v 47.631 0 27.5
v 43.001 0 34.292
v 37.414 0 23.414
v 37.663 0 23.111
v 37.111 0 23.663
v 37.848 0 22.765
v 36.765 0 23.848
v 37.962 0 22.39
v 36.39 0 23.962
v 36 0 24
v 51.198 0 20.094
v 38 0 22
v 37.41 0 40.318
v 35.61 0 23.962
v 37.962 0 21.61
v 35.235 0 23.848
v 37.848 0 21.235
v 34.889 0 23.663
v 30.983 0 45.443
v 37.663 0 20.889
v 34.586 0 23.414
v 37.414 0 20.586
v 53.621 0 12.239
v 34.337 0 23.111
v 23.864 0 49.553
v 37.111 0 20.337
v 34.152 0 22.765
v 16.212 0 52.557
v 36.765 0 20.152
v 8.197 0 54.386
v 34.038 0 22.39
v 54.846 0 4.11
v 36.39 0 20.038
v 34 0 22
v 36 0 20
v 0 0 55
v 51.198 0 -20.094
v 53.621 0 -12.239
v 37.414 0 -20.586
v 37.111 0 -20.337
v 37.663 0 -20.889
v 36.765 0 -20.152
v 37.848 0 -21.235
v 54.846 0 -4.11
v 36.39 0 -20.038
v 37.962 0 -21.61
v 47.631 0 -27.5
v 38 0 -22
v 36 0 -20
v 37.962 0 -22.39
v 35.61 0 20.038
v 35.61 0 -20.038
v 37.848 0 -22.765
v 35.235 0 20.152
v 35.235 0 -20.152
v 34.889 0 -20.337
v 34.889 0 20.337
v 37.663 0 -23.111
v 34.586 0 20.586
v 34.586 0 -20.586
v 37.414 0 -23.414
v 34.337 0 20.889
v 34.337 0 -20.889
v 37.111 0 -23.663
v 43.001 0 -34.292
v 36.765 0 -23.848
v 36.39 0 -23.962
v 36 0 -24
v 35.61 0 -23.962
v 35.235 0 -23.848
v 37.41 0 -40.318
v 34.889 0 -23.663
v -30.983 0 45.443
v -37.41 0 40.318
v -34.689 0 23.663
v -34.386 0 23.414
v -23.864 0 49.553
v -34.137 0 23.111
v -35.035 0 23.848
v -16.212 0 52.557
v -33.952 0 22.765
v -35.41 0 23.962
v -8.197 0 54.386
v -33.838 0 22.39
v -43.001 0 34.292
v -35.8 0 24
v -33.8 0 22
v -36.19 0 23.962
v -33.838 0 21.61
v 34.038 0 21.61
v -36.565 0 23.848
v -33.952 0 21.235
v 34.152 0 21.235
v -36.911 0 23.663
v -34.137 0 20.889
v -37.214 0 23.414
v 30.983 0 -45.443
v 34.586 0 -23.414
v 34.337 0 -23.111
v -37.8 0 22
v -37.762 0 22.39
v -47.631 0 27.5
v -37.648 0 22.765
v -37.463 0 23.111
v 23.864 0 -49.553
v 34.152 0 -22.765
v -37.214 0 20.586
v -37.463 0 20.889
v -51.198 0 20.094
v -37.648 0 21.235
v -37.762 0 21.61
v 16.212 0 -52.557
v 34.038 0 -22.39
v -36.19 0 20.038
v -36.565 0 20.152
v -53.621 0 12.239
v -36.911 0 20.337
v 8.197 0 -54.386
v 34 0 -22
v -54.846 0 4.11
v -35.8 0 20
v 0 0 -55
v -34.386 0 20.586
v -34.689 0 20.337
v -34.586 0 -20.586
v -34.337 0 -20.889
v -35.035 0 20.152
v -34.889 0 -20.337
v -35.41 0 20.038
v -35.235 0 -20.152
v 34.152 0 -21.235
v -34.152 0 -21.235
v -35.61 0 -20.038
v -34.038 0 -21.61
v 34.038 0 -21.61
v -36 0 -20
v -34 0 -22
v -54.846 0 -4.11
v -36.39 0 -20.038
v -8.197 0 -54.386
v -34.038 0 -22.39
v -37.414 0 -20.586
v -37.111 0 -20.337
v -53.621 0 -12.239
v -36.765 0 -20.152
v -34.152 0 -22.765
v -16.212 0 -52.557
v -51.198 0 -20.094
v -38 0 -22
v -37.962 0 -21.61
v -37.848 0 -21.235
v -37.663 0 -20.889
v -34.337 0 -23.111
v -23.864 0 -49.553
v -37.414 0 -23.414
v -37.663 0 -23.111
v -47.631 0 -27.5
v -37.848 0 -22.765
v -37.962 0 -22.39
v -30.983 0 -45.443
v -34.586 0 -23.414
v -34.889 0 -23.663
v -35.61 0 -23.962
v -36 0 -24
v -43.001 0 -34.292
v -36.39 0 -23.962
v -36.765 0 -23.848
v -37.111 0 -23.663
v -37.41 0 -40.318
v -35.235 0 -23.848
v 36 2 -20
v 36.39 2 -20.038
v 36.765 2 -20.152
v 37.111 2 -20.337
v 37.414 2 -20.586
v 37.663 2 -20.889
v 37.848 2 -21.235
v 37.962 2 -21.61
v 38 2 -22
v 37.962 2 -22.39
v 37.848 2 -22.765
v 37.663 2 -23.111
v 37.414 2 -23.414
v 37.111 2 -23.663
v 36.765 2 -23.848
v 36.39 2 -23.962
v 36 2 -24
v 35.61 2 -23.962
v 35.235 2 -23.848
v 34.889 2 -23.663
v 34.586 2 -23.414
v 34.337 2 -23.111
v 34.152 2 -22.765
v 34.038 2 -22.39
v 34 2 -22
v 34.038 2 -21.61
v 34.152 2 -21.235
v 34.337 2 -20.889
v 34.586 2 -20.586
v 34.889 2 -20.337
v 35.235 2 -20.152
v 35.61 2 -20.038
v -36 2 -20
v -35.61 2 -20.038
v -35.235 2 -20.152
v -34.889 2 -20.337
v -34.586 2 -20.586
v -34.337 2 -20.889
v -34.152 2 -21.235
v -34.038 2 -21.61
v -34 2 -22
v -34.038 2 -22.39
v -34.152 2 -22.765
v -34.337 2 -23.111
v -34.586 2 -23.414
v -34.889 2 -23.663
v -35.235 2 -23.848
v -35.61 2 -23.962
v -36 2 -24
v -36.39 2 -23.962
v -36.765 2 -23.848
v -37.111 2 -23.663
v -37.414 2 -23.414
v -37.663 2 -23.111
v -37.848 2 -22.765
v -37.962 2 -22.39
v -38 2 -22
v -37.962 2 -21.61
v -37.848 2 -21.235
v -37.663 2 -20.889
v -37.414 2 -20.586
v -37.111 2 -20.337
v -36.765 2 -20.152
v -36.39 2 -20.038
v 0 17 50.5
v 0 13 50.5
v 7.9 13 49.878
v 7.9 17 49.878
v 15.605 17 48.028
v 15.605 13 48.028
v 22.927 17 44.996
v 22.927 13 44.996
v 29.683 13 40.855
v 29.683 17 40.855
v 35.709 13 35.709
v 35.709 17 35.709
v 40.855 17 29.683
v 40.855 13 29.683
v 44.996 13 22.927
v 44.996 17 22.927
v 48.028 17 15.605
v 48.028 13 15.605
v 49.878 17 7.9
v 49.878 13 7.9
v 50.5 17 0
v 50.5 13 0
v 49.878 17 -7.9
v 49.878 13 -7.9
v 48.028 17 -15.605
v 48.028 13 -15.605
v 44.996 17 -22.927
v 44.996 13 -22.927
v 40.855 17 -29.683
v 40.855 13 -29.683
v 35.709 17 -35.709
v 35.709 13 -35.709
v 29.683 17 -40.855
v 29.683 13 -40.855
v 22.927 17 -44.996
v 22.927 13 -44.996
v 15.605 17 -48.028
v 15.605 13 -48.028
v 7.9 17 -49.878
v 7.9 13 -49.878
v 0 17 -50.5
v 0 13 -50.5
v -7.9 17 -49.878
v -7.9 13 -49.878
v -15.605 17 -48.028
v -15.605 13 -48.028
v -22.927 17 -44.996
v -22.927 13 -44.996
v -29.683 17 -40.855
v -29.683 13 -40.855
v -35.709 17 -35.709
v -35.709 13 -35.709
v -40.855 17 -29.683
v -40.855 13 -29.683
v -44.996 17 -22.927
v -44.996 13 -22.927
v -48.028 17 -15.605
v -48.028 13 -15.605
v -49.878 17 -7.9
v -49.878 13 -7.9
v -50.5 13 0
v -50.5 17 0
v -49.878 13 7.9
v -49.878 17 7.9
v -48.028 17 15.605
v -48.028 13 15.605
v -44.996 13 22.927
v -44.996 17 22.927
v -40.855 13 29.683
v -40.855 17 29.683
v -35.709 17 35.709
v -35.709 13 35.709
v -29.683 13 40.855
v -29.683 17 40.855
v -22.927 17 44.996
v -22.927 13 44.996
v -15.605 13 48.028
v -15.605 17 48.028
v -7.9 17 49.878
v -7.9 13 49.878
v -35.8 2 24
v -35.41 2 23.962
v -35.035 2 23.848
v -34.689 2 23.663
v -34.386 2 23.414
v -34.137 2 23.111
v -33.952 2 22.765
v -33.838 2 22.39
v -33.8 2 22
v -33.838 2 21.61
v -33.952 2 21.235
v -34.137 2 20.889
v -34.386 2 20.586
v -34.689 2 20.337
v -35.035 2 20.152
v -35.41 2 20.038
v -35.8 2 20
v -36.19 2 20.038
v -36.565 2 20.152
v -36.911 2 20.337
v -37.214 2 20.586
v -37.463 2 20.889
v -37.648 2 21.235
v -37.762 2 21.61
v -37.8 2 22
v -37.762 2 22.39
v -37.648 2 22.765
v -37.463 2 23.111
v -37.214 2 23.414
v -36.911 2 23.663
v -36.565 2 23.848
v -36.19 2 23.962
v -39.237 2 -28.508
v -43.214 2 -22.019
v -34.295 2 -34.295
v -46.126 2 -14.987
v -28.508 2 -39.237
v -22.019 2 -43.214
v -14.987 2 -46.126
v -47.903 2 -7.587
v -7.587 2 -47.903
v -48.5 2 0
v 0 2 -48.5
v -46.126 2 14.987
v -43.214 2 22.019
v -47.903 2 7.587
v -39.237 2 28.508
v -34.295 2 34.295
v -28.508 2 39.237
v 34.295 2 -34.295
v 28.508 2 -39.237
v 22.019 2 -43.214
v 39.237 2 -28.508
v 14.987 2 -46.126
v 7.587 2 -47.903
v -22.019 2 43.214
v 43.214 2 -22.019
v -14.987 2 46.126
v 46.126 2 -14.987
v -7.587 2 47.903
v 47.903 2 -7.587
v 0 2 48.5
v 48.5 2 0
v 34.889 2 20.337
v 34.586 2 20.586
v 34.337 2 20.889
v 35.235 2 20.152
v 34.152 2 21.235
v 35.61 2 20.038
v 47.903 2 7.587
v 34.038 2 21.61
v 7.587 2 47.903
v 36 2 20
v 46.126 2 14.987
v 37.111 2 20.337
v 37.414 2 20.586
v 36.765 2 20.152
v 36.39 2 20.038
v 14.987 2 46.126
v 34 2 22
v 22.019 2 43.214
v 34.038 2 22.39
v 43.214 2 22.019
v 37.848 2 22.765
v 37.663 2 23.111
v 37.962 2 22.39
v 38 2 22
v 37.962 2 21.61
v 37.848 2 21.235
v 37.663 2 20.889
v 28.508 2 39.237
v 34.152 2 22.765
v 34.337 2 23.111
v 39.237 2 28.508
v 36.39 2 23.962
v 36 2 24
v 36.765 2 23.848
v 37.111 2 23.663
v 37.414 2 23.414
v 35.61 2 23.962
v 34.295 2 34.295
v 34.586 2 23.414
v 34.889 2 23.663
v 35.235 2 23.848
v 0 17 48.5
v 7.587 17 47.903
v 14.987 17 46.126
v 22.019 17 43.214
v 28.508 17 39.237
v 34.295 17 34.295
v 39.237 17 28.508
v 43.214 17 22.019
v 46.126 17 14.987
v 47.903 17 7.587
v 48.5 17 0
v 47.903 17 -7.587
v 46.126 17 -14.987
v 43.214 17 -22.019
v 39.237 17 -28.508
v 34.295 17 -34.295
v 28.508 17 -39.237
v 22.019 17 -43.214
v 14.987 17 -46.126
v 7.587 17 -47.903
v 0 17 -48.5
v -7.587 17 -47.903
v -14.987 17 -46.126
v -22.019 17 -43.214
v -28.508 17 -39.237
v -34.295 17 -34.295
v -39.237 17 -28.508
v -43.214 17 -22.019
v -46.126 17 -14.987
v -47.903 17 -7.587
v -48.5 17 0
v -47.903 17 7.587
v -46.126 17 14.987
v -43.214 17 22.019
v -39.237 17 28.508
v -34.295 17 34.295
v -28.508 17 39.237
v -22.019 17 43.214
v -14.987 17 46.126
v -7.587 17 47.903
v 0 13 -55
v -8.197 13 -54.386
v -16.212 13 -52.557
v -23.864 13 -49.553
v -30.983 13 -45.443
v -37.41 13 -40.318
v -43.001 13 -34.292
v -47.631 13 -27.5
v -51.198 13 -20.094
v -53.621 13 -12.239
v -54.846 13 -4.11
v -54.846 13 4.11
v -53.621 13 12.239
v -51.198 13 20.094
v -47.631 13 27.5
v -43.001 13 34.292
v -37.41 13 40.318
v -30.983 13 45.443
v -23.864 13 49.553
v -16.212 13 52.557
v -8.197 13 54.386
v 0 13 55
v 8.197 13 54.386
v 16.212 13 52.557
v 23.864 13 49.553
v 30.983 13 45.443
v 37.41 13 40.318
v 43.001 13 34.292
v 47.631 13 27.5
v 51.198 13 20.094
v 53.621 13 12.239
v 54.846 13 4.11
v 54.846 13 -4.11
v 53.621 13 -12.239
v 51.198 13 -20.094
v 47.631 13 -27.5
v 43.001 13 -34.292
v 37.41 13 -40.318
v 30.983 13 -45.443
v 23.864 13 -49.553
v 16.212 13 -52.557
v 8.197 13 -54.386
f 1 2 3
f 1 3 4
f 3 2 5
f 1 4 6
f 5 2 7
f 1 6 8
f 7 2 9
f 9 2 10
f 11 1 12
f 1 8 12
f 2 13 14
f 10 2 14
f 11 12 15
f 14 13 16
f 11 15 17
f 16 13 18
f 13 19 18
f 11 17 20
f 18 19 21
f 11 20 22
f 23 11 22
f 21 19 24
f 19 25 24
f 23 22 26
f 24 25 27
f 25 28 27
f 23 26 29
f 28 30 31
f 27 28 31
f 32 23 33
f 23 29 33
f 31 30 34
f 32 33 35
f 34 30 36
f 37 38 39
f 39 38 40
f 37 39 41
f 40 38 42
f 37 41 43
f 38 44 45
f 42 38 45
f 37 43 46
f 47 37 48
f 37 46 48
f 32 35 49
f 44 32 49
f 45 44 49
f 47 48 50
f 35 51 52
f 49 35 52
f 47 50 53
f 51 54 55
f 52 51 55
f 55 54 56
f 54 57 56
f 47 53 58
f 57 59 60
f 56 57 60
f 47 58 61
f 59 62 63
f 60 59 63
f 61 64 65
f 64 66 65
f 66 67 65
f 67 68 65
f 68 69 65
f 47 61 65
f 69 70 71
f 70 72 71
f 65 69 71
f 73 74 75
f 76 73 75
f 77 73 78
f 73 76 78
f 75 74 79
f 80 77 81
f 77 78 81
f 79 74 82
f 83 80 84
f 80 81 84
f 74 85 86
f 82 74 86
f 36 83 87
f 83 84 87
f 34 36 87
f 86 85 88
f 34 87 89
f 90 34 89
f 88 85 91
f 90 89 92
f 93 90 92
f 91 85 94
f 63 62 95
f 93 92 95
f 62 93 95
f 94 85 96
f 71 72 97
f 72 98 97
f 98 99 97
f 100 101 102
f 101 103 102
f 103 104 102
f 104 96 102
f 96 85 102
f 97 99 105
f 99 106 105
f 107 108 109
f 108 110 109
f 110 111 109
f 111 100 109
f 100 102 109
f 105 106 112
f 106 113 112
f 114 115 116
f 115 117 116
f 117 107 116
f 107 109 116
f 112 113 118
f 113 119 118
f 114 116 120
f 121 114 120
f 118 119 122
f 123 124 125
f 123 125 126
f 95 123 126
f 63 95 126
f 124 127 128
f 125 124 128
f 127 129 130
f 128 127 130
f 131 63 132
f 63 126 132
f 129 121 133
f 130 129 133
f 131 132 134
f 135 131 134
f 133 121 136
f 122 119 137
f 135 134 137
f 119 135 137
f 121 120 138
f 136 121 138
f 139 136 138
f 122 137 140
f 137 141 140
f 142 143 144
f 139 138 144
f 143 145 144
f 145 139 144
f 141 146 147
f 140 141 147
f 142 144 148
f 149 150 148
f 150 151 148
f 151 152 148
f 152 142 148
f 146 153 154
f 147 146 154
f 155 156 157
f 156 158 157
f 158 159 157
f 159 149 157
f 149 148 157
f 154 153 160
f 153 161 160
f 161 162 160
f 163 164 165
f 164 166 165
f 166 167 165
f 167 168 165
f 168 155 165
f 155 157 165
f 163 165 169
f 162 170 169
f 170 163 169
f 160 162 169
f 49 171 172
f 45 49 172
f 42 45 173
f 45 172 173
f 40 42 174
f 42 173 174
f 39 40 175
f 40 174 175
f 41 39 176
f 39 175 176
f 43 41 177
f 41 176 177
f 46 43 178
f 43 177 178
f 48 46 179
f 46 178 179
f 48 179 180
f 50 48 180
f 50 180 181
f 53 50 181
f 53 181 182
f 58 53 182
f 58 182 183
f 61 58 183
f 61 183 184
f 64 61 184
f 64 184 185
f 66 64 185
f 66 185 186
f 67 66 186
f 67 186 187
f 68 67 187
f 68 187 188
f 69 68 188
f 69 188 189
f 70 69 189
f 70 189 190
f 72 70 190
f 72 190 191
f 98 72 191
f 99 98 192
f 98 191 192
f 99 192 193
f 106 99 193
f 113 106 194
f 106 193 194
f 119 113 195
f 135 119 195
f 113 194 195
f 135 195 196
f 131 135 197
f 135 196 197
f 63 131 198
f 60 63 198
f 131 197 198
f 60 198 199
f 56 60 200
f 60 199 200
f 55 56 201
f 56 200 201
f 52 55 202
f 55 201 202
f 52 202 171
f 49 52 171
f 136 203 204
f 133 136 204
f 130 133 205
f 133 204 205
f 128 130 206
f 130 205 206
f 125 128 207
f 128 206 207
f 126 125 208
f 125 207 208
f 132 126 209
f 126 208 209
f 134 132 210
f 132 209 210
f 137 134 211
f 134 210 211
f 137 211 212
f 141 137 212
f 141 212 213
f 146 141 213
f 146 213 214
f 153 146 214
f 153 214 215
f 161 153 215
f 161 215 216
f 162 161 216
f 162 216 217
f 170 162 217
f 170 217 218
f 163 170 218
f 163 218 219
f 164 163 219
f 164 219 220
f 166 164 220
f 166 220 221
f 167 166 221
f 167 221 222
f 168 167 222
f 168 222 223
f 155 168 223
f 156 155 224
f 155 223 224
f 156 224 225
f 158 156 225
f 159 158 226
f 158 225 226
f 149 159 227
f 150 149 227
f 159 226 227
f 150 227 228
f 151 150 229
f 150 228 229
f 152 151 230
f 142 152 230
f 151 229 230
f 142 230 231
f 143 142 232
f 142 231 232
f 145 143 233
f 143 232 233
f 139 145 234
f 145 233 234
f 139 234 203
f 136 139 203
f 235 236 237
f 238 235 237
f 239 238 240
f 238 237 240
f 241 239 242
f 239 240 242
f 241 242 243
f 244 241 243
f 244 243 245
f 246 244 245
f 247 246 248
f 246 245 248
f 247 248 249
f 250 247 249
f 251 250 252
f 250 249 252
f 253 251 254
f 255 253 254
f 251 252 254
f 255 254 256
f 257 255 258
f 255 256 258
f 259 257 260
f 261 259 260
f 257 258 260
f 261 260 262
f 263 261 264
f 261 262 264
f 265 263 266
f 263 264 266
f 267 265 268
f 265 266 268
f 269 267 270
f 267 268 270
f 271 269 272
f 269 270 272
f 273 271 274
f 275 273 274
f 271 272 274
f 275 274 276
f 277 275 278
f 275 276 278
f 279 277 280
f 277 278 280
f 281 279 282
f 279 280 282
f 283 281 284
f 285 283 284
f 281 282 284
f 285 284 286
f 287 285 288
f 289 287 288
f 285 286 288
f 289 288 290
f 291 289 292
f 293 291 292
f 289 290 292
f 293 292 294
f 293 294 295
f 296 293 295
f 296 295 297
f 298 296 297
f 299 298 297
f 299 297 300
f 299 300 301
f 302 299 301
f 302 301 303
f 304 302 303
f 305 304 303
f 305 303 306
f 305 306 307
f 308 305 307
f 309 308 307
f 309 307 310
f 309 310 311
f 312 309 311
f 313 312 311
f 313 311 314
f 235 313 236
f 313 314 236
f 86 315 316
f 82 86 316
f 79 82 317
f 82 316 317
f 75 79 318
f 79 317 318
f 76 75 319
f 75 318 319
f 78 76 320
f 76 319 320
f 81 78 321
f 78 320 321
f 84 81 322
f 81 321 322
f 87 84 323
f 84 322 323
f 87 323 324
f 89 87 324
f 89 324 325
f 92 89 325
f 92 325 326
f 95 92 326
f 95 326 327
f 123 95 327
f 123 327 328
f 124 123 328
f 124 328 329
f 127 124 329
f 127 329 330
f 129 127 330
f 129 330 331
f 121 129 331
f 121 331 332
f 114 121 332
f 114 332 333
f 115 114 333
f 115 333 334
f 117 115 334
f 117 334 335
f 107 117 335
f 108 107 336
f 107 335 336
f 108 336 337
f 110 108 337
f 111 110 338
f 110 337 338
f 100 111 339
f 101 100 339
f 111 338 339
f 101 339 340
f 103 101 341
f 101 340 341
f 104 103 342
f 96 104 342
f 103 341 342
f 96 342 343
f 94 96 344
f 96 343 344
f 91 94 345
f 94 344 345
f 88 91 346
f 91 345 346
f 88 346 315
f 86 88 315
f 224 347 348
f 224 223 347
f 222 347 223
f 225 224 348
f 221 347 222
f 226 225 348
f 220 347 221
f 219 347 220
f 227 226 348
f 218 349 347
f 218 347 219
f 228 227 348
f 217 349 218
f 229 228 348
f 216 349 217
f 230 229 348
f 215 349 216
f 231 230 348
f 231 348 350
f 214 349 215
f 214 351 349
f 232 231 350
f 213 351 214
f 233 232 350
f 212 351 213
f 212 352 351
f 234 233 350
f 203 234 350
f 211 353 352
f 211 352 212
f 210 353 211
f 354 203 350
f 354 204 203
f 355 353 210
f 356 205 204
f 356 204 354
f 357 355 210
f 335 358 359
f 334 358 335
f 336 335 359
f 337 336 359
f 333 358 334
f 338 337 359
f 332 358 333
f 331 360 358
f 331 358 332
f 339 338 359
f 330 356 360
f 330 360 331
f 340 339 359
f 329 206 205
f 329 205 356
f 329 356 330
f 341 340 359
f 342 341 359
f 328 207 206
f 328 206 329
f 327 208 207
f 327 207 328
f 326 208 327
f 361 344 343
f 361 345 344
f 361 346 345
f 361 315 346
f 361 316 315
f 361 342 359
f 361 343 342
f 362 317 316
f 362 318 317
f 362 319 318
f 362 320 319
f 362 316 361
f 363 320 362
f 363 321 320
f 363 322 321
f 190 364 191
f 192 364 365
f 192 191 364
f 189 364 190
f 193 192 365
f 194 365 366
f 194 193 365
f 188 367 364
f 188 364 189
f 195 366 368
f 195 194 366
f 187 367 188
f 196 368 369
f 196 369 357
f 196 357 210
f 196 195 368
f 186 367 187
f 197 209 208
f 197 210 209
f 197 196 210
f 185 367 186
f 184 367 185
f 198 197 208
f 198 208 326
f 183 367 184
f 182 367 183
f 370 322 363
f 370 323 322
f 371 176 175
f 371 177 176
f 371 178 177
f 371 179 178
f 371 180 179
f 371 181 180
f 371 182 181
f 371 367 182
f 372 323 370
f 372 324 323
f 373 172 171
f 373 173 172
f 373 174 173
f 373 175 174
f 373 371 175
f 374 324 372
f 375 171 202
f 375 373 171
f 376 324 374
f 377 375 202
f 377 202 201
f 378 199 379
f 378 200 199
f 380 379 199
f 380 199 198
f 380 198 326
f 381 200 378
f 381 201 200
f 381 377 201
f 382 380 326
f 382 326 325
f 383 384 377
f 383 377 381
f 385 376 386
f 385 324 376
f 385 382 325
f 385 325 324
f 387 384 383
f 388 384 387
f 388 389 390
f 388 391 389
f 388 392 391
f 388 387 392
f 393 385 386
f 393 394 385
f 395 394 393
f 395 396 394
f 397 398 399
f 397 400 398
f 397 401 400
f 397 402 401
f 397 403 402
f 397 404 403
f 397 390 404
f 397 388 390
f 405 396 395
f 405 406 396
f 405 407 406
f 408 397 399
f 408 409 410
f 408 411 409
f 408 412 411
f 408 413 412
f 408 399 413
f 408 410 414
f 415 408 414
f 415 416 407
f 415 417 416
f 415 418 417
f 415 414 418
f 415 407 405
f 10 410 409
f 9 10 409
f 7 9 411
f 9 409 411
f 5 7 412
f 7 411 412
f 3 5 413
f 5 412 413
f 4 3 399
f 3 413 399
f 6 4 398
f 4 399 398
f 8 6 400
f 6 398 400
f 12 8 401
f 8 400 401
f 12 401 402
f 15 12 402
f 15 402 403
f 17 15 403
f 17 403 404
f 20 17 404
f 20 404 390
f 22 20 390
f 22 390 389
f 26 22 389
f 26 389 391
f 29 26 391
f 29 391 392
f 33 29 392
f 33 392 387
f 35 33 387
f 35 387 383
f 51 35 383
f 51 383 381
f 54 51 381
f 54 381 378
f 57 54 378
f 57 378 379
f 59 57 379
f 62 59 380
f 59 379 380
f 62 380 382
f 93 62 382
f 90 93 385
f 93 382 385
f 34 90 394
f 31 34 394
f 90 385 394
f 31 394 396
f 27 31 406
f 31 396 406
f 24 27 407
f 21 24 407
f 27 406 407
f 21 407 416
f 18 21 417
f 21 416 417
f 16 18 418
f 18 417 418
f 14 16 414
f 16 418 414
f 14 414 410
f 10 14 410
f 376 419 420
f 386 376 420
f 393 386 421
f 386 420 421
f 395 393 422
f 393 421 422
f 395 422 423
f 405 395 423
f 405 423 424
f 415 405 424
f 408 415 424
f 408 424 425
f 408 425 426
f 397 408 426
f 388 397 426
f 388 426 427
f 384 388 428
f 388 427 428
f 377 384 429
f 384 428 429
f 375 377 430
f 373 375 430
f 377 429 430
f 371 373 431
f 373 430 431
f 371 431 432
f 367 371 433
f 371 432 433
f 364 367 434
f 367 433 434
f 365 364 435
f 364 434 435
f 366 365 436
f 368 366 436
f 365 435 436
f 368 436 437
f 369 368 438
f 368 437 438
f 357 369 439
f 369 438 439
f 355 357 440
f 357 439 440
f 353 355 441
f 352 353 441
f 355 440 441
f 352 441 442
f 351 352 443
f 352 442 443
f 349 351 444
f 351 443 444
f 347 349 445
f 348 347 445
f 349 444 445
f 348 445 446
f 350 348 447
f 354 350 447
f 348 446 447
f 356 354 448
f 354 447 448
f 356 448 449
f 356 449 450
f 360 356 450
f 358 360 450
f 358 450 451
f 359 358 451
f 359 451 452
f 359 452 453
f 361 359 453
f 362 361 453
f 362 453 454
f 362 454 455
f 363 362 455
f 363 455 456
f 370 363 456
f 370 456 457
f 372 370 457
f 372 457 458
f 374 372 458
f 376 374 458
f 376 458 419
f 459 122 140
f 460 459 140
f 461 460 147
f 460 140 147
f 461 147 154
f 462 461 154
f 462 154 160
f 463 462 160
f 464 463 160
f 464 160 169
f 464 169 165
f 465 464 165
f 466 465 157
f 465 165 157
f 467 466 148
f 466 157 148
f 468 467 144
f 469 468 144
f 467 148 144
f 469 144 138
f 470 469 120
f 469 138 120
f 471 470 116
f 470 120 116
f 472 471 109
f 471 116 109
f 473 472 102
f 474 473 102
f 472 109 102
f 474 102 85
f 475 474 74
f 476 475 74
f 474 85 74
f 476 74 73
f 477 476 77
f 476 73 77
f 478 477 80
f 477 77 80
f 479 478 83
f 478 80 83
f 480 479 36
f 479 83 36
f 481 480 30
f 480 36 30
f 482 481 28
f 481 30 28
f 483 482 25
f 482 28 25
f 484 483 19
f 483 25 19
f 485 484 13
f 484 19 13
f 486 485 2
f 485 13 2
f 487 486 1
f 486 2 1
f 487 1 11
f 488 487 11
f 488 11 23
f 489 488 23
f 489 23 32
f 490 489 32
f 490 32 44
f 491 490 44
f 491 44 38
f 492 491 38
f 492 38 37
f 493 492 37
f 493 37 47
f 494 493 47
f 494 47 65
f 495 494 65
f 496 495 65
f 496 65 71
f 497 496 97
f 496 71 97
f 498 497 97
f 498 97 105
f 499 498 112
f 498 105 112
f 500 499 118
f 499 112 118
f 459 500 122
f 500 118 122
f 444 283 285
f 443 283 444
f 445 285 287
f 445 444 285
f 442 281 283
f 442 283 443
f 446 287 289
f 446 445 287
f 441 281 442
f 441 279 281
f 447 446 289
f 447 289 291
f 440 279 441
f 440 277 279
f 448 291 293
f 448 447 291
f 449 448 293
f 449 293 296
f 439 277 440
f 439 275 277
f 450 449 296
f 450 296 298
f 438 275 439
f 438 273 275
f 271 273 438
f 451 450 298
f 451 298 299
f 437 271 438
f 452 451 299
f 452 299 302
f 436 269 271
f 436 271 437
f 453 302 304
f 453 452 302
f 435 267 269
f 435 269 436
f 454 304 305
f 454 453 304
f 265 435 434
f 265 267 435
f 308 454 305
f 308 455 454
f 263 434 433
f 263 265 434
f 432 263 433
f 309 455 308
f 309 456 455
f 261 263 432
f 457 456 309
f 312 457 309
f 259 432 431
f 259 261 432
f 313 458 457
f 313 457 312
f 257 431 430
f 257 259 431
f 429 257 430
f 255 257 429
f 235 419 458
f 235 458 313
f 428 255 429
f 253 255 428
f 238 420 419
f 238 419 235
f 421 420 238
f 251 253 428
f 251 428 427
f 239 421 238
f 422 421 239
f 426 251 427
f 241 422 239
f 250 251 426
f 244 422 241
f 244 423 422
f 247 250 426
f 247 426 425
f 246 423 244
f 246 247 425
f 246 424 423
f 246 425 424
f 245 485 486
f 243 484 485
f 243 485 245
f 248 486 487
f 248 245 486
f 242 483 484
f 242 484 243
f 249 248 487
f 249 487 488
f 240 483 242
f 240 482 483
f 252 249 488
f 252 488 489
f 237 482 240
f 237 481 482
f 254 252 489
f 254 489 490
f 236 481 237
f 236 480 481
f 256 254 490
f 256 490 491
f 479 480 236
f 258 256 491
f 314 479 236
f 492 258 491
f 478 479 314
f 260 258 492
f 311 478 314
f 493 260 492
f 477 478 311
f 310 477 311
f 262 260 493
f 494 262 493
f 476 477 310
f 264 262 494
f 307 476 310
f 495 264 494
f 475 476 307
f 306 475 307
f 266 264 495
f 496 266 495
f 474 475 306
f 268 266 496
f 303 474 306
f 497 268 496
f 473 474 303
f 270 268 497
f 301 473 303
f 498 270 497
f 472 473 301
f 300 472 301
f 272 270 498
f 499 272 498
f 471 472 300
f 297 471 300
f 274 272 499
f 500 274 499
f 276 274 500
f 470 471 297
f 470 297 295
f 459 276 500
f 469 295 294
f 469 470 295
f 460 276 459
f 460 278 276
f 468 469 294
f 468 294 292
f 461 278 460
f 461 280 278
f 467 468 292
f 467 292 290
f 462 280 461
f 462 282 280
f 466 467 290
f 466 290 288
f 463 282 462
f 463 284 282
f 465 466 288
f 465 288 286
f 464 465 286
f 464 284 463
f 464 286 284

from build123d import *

# Parameters (mm, degrees)
SKETCH2_R           = 55
BOSS_EXTRUDE2_DEPTH = 13
SKETCH7_R           = 50.5
BOSS_EXTRUDE3_DEPTH = 4
SKETCH8_R           = 48.5
CUT_EXTRUDE3_DEPTH  = 15
SKETCH9_R           = 2
CUT_EXTRUDE4_DEPTH  = 15


with BuildPart() as part:
    # Sketch2 → Boss-Extrude2 (new body)
    with BuildSketch(Plane(origin=(0, 0, 0), x_dir=(1, 0, 0), z_dir=(0, 1, 0))):
        with Locations(Location((0, 0, 0), (0, 0, 90))):
            Circle(SKETCH2_R)
    extrude(amount=BOSS_EXTRUDE2_DEPTH)

    # Sketch7 → Boss-Extrude3 (add)
    with BuildSketch(Plane(origin=(0, 13, 0), x_dir=(1, 0, 0), z_dir=(0, 1, 0))):
        with Locations(Location((0, 0, 0), (0, 0, 270))):
            Circle(SKETCH7_R)
    extrude(amount=BOSS_EXTRUDE3_DEPTH)

    # Sketch8 → Cut-Extrude3 (cut)
    with BuildSketch(Plane(origin=(0, 17, 0), x_dir=(1, 0, 0), z_dir=(0, 1, 0))):
        with Locations(Location((0, 0, 0), (0, 0, 270))):
            Circle(SKETCH8_R)
    extrude(amount=-CUT_EXTRUDE3_DEPTH, mode=Mode.SUBTRACT)

    # Sketch9 → Cut-Extrude4 (cut)
    with BuildSketch(Plane(origin=(0, 2, 0), x_dir=(1, 0, 0), z_dir=(0, 1, 0))):
        with Locations(Location((36, -22, 0), (0, 0, 270))):
            Circle(SKETCH9_R)
        with Locations(Location((-36, 22, 0), (0, 0, 270))):
            Circle(SKETCH9_R)
        with Locations(Location((-35.8, -22, 0), (0, 0, 270))):
            Circle(SKETCH9_R)
        with Locations(Location((36, 22, 0), (0, 0, 270))):
            Circle(SKETCH9_R)
    extrude(amount=-CUT_EXTRUDE4_DEPTH, mode=Mode.SUBTRACT)


solid = part.part
